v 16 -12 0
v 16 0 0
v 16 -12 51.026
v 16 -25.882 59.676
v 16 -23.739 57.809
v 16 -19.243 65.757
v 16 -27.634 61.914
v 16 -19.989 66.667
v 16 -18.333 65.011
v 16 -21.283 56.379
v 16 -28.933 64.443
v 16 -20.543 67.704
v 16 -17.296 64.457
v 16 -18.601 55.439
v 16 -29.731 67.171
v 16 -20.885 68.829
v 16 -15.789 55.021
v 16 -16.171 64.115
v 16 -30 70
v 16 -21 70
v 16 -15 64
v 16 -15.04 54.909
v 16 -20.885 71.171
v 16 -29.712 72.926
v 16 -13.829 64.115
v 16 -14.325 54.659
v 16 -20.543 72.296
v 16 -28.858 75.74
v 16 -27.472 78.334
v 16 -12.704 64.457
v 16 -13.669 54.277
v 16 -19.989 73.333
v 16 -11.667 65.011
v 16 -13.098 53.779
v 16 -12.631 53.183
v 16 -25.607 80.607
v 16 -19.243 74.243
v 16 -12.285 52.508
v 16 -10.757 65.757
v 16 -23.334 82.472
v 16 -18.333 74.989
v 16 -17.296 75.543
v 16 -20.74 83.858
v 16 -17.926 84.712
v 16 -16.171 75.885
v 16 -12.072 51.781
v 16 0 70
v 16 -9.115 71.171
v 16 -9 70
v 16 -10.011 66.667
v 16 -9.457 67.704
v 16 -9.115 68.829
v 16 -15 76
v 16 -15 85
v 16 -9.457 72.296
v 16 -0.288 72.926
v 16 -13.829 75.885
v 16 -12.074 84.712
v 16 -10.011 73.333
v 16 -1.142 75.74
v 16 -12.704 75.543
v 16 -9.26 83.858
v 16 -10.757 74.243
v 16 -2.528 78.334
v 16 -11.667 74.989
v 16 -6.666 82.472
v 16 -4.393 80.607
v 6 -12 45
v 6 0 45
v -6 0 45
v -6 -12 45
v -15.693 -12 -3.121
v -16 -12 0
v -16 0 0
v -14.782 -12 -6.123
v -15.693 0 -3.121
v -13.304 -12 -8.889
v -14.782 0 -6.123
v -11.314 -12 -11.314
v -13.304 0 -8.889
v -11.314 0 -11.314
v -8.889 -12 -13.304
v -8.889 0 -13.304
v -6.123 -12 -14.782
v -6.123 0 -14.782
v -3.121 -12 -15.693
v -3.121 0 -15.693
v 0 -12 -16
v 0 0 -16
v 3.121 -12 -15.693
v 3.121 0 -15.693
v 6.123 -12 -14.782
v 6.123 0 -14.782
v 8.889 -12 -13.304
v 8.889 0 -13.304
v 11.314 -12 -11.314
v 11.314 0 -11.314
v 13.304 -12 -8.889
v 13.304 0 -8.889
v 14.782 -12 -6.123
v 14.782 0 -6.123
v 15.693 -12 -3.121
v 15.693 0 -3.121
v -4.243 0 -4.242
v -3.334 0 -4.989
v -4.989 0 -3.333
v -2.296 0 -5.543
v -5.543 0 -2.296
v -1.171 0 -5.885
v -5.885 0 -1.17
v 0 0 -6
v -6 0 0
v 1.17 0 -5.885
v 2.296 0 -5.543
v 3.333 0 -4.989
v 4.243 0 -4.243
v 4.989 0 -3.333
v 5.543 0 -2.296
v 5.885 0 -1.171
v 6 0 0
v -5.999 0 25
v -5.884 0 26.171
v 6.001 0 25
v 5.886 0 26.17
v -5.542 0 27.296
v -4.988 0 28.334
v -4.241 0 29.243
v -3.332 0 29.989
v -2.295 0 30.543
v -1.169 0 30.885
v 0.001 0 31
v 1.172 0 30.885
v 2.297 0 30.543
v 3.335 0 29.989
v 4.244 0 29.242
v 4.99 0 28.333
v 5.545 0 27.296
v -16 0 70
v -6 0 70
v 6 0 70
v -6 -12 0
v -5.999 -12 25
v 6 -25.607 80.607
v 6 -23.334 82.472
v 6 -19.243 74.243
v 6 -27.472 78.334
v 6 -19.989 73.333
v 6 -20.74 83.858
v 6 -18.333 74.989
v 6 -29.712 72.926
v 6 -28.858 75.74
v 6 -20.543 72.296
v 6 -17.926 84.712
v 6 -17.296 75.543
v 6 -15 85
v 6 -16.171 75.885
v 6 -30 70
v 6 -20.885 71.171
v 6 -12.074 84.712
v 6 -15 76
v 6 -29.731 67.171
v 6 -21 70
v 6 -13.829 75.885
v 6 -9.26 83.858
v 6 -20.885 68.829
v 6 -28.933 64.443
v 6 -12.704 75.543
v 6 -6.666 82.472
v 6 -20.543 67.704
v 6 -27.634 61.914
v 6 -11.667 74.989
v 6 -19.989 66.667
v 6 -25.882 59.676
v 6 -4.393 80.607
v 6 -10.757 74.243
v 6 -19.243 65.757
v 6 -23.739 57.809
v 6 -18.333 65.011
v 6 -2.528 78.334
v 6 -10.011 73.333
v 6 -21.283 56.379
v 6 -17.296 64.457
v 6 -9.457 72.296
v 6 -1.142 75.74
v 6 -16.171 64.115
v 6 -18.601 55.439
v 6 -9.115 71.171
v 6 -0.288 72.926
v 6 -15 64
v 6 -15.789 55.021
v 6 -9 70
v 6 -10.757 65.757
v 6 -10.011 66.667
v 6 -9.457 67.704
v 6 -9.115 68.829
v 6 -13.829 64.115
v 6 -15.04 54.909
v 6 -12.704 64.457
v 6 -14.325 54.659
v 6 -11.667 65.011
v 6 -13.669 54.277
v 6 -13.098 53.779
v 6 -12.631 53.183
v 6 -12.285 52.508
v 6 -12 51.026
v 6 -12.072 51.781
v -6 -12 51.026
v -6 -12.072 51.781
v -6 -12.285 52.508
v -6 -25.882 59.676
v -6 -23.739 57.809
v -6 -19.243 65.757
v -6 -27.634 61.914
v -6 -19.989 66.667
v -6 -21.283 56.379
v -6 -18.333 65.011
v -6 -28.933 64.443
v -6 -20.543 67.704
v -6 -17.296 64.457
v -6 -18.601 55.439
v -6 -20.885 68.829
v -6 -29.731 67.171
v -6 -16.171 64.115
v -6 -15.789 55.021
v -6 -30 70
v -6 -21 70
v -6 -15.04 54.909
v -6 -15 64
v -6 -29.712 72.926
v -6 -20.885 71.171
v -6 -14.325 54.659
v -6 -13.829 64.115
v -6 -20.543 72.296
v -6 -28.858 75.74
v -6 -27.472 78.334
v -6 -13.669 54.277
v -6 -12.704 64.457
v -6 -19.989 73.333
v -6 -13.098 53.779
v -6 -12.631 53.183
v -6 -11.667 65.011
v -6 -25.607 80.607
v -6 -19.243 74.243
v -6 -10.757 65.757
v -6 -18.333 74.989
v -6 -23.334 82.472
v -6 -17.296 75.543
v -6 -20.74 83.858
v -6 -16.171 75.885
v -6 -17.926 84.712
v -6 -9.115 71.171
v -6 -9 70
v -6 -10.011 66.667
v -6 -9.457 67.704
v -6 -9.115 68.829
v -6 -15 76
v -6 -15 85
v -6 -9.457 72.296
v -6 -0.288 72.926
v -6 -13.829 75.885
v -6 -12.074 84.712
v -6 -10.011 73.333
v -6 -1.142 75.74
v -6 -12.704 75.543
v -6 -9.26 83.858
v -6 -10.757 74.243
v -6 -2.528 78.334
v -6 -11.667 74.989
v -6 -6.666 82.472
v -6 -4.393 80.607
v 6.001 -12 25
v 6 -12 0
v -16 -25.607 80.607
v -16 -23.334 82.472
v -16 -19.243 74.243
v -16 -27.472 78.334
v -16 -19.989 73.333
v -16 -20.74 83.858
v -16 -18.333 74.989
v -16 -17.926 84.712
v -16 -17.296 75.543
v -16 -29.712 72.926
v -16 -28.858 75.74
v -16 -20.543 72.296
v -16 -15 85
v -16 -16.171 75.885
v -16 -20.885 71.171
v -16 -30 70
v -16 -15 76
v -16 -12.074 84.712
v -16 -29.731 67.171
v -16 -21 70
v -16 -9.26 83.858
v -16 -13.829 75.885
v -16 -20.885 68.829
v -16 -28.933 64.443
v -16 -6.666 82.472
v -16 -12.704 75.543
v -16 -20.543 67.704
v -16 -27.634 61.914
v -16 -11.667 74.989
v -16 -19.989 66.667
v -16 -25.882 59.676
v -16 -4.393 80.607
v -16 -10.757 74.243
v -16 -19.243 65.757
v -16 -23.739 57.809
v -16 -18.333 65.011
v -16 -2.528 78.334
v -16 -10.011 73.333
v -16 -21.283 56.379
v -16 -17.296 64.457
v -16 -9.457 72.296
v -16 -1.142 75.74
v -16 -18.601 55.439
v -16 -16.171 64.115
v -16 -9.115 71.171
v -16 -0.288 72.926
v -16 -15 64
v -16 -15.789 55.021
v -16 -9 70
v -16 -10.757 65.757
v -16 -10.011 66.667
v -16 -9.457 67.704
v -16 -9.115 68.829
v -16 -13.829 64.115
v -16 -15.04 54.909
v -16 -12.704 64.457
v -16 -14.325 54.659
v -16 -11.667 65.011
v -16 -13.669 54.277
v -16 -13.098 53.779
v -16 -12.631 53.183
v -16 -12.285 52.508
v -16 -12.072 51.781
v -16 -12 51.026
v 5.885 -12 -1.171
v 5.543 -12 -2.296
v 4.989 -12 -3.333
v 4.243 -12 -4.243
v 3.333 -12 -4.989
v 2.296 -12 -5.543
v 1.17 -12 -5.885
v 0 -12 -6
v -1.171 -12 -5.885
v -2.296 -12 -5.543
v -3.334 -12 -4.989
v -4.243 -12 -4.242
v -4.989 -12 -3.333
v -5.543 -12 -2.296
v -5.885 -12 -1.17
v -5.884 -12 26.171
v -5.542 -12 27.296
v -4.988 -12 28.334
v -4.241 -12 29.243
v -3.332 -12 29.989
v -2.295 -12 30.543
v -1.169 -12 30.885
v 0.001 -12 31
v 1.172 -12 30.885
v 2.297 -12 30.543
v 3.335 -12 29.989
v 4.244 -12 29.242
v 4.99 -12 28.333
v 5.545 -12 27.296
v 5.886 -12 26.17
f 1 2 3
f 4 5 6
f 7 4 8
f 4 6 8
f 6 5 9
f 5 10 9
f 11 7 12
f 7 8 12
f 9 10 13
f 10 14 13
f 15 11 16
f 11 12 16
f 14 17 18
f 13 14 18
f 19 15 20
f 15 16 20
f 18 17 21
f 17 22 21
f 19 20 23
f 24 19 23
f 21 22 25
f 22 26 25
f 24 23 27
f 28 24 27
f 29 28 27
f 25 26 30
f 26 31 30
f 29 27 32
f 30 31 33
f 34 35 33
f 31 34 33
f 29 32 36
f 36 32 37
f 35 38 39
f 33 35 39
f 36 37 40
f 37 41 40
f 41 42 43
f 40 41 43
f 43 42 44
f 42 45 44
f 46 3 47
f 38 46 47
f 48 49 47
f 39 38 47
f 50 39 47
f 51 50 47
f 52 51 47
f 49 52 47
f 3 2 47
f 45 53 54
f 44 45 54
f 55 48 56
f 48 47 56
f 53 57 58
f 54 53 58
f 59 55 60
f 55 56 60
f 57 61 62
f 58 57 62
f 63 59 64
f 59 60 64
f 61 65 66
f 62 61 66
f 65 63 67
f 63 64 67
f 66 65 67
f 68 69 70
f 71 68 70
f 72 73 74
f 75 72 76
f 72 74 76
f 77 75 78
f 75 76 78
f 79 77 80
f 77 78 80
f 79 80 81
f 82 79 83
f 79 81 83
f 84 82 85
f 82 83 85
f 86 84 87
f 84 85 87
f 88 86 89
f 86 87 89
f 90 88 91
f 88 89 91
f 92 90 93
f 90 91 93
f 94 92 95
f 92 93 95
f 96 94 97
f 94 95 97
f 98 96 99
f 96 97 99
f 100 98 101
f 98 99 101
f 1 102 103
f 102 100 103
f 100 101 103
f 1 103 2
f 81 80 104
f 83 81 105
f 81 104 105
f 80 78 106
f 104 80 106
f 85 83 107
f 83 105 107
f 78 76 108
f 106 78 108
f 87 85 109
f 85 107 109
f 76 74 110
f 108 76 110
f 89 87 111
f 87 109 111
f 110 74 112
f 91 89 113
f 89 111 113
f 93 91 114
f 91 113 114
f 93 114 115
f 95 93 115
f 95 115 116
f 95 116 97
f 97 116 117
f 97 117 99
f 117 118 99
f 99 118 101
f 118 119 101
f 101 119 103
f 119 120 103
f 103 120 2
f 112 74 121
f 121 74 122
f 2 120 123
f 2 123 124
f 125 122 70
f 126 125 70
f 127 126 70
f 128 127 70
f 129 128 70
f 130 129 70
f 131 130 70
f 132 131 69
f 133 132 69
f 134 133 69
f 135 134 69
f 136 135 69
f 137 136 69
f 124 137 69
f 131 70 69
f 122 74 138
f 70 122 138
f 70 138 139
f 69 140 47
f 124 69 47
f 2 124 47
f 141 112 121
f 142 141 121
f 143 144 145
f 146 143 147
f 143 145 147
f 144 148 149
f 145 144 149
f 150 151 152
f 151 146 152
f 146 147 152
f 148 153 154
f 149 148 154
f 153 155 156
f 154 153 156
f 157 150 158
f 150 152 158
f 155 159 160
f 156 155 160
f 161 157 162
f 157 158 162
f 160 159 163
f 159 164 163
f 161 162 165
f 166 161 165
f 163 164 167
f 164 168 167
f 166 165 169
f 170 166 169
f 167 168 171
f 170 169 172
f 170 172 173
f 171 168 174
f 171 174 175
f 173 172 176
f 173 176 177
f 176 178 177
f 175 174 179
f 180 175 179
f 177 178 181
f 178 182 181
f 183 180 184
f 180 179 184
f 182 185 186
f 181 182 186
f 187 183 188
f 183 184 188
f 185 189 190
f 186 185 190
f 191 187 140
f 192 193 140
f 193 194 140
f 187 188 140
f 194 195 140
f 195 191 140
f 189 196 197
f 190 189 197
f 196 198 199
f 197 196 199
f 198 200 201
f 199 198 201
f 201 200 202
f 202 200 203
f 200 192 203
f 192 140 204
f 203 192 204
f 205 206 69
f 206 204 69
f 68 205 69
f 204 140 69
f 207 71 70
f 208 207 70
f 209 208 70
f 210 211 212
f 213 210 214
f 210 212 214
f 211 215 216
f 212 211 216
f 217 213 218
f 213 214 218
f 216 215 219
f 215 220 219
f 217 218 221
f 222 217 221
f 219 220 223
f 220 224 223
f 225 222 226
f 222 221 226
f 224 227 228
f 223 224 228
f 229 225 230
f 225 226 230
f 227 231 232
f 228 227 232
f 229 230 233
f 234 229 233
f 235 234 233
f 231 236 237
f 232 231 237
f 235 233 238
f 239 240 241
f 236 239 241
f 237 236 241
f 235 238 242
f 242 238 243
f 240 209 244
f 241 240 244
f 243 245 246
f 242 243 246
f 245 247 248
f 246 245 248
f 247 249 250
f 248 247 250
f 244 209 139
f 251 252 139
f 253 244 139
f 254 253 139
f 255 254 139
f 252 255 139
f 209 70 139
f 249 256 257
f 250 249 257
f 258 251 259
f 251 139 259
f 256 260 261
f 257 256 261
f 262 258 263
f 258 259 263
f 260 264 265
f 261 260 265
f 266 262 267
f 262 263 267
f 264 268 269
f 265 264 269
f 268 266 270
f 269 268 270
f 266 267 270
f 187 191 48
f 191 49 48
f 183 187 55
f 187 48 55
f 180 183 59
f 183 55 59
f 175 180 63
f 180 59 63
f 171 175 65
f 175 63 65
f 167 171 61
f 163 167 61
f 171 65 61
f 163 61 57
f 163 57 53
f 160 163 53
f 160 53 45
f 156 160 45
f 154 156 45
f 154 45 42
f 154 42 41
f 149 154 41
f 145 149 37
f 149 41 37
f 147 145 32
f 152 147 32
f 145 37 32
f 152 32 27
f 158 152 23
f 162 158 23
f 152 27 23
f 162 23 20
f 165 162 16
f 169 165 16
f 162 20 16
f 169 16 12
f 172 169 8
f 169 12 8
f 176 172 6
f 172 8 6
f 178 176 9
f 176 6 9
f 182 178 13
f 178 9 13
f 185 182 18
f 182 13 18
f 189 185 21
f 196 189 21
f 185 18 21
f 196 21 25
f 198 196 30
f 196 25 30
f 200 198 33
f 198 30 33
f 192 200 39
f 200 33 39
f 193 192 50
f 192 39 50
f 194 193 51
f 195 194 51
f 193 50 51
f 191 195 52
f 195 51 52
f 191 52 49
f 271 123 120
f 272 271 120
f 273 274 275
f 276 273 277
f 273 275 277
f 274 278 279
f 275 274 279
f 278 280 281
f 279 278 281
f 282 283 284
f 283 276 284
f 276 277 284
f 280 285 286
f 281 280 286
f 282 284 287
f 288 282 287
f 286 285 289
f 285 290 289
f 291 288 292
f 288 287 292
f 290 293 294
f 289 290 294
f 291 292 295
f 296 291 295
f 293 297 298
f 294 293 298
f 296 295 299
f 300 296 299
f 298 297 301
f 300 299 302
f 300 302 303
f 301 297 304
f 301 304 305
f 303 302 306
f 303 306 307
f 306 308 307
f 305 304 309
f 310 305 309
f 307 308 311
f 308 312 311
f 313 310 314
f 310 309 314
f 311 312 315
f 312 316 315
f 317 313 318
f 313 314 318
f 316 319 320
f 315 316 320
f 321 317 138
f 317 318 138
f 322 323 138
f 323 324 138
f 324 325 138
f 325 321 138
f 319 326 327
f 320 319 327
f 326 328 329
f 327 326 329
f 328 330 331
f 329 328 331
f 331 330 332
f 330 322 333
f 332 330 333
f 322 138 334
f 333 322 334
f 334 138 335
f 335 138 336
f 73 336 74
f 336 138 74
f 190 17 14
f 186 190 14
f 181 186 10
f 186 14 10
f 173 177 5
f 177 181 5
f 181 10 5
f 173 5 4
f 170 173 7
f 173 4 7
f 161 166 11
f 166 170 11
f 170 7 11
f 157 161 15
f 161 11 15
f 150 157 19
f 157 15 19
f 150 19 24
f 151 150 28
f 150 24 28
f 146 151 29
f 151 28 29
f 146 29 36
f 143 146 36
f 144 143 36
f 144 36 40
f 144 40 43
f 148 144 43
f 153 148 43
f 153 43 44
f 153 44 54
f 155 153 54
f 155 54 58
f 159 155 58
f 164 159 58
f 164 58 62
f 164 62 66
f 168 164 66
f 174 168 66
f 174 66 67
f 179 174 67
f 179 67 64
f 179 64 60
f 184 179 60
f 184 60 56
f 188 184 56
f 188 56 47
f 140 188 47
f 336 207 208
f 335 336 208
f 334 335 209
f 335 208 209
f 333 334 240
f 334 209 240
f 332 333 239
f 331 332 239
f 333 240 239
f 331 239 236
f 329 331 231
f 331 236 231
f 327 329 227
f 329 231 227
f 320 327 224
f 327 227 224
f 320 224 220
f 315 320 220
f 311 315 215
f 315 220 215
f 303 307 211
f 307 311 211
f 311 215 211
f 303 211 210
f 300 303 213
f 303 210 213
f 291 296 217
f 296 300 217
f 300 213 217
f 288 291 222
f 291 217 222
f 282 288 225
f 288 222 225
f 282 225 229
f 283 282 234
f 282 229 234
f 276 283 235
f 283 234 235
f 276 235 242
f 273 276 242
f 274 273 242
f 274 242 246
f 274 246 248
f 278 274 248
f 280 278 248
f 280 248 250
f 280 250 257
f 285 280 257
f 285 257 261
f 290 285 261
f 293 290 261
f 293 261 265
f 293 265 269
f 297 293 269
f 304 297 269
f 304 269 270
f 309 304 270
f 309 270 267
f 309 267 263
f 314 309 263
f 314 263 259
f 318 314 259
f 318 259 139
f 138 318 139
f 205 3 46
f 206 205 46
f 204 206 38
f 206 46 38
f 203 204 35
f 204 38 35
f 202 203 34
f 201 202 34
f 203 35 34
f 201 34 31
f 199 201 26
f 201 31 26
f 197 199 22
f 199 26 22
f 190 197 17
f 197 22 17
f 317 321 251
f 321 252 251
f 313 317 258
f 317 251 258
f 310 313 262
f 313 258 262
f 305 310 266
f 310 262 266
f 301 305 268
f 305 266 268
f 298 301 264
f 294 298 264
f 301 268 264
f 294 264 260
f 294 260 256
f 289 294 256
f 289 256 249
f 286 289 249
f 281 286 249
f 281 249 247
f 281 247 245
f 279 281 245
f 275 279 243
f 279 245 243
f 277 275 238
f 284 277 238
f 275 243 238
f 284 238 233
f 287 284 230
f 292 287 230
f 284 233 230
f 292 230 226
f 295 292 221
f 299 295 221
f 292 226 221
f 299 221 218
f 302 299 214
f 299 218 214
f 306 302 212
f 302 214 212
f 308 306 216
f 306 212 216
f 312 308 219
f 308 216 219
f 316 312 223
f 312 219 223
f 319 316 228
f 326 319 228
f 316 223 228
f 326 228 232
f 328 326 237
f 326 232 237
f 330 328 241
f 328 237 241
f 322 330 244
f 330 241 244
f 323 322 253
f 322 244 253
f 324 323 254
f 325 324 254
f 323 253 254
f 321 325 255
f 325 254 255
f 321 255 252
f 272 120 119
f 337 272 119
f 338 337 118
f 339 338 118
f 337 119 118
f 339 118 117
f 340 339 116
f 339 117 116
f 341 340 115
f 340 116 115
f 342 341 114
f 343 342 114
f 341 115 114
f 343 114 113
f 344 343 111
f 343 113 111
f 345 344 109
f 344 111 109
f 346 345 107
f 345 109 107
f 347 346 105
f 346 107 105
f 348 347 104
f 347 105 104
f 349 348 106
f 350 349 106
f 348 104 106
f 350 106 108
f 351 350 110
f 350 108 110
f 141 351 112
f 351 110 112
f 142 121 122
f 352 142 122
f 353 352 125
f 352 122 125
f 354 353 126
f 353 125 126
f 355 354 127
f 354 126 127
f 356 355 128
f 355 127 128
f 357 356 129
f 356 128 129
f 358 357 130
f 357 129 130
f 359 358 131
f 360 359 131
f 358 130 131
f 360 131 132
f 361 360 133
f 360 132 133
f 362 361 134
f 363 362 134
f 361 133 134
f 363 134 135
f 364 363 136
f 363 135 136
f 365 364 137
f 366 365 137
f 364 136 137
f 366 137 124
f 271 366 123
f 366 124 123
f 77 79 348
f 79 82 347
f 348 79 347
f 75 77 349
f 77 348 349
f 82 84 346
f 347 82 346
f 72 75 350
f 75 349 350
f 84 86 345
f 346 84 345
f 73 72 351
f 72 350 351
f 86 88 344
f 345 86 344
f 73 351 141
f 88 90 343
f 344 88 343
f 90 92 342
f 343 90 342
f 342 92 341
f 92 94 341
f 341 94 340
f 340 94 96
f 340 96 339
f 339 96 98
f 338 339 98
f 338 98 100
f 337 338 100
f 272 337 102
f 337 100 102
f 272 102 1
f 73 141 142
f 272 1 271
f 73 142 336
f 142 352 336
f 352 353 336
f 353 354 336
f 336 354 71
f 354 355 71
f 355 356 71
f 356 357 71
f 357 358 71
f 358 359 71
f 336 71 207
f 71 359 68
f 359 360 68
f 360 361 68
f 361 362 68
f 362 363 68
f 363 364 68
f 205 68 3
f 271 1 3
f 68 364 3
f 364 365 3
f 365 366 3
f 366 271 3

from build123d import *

# Parameters (mm, degrees)
F1_DEPTH = 30
F3_DEPTH = 50
F2_R     = 6
F4_DEPTH = 25.5


# Not quite as in the source:
# - a feature of the source that left no trace in its solid (it failed there, or was rolled back) is left out


with BuildPart() as f1:
    # F0 (on Front) → F1 (new body)
    with BuildSketch(Plane.XZ):
        with BuildLine():
            Line((-16, 85), (-16, 0))
            ThreePointArc((-16, 0), (0, -16), (16, 0))
            Line((16, 0), (16, 85))
            Line((16, 85), (6, 85))
            Line((6, 85), (6, 45))
            Line((6, 45), (-6, 45))
            Line((-6, 45), (-6, 85))
            Line((-6, 85), (-16, 85))
        make_face()
        with BuildLine():
            ThreePointArc((6, 1.3e-09), (-0.0001359155, -5.9999999985), (-5.9999999938, 0.0002718323))
            Line((-5.9999999938, 0.0002718323), (-5.9988673594, 25.0002718323))
            ThreePointArc((-5.9988673594, 25.0002718323), (0.0014044667, 30.9999999938), (6.0011326283, 24.9997281677))
            Line((6.0011326283, 24.9997281677), (6.0000000062, 0))
        make_face(mode=Mode.SUBTRACT)
    extrude(amount=F1_DEPTH)

    # F2 (on Right) → F3 (cut, symmetric)
    with BuildSketch(Plane.YZ):
        with BuildLine():
            ThreePointArc((-15.7894736842, 55.0207900308), (-25.8821437517, 59.6762919758), (-30, 70))
            Line((-30, 70), (-30, -16))
            Line((-30, -16), (-12, -16))
            Line((-12, -16), (-12, 51.026334039))
            ThreePointArc((-12, 51.026334039), (-13.0980949996, 53.7793228454), (-15.7894736842, 55.0207900308))
        make_face()
        with BuildLine():
            Line((-30, 85), (-30, 70))
            ThreePointArc((-30, 70), (-25.6066016991, 80.6066017365), (-14.9999999471, 85))
            Line((-14.9999999471, 85), (-30, 85))
        make_face()
        with BuildLine():
            Line((0, 85), (-14.9999999471, 85))
            ThreePointArc((-14.9999999471, 85), (-4.3933982635, 80.6066016991), (0, 70))
            Line((0, 70), (0, 85))
        make_face()
    extrude(amount=F3_DEPTH, both=True, mode=Mode.SUBTRACT)

    # F2 (on Right) → F4 (cut, symmetric)
    with BuildSketch(Plane.YZ):
        with Locations((-15, 70)):
            Circle(F2_R)
    extrude(amount=F4_DEPTH, both=True, mode=Mode.SUBTRACT)


solid = f1.part
